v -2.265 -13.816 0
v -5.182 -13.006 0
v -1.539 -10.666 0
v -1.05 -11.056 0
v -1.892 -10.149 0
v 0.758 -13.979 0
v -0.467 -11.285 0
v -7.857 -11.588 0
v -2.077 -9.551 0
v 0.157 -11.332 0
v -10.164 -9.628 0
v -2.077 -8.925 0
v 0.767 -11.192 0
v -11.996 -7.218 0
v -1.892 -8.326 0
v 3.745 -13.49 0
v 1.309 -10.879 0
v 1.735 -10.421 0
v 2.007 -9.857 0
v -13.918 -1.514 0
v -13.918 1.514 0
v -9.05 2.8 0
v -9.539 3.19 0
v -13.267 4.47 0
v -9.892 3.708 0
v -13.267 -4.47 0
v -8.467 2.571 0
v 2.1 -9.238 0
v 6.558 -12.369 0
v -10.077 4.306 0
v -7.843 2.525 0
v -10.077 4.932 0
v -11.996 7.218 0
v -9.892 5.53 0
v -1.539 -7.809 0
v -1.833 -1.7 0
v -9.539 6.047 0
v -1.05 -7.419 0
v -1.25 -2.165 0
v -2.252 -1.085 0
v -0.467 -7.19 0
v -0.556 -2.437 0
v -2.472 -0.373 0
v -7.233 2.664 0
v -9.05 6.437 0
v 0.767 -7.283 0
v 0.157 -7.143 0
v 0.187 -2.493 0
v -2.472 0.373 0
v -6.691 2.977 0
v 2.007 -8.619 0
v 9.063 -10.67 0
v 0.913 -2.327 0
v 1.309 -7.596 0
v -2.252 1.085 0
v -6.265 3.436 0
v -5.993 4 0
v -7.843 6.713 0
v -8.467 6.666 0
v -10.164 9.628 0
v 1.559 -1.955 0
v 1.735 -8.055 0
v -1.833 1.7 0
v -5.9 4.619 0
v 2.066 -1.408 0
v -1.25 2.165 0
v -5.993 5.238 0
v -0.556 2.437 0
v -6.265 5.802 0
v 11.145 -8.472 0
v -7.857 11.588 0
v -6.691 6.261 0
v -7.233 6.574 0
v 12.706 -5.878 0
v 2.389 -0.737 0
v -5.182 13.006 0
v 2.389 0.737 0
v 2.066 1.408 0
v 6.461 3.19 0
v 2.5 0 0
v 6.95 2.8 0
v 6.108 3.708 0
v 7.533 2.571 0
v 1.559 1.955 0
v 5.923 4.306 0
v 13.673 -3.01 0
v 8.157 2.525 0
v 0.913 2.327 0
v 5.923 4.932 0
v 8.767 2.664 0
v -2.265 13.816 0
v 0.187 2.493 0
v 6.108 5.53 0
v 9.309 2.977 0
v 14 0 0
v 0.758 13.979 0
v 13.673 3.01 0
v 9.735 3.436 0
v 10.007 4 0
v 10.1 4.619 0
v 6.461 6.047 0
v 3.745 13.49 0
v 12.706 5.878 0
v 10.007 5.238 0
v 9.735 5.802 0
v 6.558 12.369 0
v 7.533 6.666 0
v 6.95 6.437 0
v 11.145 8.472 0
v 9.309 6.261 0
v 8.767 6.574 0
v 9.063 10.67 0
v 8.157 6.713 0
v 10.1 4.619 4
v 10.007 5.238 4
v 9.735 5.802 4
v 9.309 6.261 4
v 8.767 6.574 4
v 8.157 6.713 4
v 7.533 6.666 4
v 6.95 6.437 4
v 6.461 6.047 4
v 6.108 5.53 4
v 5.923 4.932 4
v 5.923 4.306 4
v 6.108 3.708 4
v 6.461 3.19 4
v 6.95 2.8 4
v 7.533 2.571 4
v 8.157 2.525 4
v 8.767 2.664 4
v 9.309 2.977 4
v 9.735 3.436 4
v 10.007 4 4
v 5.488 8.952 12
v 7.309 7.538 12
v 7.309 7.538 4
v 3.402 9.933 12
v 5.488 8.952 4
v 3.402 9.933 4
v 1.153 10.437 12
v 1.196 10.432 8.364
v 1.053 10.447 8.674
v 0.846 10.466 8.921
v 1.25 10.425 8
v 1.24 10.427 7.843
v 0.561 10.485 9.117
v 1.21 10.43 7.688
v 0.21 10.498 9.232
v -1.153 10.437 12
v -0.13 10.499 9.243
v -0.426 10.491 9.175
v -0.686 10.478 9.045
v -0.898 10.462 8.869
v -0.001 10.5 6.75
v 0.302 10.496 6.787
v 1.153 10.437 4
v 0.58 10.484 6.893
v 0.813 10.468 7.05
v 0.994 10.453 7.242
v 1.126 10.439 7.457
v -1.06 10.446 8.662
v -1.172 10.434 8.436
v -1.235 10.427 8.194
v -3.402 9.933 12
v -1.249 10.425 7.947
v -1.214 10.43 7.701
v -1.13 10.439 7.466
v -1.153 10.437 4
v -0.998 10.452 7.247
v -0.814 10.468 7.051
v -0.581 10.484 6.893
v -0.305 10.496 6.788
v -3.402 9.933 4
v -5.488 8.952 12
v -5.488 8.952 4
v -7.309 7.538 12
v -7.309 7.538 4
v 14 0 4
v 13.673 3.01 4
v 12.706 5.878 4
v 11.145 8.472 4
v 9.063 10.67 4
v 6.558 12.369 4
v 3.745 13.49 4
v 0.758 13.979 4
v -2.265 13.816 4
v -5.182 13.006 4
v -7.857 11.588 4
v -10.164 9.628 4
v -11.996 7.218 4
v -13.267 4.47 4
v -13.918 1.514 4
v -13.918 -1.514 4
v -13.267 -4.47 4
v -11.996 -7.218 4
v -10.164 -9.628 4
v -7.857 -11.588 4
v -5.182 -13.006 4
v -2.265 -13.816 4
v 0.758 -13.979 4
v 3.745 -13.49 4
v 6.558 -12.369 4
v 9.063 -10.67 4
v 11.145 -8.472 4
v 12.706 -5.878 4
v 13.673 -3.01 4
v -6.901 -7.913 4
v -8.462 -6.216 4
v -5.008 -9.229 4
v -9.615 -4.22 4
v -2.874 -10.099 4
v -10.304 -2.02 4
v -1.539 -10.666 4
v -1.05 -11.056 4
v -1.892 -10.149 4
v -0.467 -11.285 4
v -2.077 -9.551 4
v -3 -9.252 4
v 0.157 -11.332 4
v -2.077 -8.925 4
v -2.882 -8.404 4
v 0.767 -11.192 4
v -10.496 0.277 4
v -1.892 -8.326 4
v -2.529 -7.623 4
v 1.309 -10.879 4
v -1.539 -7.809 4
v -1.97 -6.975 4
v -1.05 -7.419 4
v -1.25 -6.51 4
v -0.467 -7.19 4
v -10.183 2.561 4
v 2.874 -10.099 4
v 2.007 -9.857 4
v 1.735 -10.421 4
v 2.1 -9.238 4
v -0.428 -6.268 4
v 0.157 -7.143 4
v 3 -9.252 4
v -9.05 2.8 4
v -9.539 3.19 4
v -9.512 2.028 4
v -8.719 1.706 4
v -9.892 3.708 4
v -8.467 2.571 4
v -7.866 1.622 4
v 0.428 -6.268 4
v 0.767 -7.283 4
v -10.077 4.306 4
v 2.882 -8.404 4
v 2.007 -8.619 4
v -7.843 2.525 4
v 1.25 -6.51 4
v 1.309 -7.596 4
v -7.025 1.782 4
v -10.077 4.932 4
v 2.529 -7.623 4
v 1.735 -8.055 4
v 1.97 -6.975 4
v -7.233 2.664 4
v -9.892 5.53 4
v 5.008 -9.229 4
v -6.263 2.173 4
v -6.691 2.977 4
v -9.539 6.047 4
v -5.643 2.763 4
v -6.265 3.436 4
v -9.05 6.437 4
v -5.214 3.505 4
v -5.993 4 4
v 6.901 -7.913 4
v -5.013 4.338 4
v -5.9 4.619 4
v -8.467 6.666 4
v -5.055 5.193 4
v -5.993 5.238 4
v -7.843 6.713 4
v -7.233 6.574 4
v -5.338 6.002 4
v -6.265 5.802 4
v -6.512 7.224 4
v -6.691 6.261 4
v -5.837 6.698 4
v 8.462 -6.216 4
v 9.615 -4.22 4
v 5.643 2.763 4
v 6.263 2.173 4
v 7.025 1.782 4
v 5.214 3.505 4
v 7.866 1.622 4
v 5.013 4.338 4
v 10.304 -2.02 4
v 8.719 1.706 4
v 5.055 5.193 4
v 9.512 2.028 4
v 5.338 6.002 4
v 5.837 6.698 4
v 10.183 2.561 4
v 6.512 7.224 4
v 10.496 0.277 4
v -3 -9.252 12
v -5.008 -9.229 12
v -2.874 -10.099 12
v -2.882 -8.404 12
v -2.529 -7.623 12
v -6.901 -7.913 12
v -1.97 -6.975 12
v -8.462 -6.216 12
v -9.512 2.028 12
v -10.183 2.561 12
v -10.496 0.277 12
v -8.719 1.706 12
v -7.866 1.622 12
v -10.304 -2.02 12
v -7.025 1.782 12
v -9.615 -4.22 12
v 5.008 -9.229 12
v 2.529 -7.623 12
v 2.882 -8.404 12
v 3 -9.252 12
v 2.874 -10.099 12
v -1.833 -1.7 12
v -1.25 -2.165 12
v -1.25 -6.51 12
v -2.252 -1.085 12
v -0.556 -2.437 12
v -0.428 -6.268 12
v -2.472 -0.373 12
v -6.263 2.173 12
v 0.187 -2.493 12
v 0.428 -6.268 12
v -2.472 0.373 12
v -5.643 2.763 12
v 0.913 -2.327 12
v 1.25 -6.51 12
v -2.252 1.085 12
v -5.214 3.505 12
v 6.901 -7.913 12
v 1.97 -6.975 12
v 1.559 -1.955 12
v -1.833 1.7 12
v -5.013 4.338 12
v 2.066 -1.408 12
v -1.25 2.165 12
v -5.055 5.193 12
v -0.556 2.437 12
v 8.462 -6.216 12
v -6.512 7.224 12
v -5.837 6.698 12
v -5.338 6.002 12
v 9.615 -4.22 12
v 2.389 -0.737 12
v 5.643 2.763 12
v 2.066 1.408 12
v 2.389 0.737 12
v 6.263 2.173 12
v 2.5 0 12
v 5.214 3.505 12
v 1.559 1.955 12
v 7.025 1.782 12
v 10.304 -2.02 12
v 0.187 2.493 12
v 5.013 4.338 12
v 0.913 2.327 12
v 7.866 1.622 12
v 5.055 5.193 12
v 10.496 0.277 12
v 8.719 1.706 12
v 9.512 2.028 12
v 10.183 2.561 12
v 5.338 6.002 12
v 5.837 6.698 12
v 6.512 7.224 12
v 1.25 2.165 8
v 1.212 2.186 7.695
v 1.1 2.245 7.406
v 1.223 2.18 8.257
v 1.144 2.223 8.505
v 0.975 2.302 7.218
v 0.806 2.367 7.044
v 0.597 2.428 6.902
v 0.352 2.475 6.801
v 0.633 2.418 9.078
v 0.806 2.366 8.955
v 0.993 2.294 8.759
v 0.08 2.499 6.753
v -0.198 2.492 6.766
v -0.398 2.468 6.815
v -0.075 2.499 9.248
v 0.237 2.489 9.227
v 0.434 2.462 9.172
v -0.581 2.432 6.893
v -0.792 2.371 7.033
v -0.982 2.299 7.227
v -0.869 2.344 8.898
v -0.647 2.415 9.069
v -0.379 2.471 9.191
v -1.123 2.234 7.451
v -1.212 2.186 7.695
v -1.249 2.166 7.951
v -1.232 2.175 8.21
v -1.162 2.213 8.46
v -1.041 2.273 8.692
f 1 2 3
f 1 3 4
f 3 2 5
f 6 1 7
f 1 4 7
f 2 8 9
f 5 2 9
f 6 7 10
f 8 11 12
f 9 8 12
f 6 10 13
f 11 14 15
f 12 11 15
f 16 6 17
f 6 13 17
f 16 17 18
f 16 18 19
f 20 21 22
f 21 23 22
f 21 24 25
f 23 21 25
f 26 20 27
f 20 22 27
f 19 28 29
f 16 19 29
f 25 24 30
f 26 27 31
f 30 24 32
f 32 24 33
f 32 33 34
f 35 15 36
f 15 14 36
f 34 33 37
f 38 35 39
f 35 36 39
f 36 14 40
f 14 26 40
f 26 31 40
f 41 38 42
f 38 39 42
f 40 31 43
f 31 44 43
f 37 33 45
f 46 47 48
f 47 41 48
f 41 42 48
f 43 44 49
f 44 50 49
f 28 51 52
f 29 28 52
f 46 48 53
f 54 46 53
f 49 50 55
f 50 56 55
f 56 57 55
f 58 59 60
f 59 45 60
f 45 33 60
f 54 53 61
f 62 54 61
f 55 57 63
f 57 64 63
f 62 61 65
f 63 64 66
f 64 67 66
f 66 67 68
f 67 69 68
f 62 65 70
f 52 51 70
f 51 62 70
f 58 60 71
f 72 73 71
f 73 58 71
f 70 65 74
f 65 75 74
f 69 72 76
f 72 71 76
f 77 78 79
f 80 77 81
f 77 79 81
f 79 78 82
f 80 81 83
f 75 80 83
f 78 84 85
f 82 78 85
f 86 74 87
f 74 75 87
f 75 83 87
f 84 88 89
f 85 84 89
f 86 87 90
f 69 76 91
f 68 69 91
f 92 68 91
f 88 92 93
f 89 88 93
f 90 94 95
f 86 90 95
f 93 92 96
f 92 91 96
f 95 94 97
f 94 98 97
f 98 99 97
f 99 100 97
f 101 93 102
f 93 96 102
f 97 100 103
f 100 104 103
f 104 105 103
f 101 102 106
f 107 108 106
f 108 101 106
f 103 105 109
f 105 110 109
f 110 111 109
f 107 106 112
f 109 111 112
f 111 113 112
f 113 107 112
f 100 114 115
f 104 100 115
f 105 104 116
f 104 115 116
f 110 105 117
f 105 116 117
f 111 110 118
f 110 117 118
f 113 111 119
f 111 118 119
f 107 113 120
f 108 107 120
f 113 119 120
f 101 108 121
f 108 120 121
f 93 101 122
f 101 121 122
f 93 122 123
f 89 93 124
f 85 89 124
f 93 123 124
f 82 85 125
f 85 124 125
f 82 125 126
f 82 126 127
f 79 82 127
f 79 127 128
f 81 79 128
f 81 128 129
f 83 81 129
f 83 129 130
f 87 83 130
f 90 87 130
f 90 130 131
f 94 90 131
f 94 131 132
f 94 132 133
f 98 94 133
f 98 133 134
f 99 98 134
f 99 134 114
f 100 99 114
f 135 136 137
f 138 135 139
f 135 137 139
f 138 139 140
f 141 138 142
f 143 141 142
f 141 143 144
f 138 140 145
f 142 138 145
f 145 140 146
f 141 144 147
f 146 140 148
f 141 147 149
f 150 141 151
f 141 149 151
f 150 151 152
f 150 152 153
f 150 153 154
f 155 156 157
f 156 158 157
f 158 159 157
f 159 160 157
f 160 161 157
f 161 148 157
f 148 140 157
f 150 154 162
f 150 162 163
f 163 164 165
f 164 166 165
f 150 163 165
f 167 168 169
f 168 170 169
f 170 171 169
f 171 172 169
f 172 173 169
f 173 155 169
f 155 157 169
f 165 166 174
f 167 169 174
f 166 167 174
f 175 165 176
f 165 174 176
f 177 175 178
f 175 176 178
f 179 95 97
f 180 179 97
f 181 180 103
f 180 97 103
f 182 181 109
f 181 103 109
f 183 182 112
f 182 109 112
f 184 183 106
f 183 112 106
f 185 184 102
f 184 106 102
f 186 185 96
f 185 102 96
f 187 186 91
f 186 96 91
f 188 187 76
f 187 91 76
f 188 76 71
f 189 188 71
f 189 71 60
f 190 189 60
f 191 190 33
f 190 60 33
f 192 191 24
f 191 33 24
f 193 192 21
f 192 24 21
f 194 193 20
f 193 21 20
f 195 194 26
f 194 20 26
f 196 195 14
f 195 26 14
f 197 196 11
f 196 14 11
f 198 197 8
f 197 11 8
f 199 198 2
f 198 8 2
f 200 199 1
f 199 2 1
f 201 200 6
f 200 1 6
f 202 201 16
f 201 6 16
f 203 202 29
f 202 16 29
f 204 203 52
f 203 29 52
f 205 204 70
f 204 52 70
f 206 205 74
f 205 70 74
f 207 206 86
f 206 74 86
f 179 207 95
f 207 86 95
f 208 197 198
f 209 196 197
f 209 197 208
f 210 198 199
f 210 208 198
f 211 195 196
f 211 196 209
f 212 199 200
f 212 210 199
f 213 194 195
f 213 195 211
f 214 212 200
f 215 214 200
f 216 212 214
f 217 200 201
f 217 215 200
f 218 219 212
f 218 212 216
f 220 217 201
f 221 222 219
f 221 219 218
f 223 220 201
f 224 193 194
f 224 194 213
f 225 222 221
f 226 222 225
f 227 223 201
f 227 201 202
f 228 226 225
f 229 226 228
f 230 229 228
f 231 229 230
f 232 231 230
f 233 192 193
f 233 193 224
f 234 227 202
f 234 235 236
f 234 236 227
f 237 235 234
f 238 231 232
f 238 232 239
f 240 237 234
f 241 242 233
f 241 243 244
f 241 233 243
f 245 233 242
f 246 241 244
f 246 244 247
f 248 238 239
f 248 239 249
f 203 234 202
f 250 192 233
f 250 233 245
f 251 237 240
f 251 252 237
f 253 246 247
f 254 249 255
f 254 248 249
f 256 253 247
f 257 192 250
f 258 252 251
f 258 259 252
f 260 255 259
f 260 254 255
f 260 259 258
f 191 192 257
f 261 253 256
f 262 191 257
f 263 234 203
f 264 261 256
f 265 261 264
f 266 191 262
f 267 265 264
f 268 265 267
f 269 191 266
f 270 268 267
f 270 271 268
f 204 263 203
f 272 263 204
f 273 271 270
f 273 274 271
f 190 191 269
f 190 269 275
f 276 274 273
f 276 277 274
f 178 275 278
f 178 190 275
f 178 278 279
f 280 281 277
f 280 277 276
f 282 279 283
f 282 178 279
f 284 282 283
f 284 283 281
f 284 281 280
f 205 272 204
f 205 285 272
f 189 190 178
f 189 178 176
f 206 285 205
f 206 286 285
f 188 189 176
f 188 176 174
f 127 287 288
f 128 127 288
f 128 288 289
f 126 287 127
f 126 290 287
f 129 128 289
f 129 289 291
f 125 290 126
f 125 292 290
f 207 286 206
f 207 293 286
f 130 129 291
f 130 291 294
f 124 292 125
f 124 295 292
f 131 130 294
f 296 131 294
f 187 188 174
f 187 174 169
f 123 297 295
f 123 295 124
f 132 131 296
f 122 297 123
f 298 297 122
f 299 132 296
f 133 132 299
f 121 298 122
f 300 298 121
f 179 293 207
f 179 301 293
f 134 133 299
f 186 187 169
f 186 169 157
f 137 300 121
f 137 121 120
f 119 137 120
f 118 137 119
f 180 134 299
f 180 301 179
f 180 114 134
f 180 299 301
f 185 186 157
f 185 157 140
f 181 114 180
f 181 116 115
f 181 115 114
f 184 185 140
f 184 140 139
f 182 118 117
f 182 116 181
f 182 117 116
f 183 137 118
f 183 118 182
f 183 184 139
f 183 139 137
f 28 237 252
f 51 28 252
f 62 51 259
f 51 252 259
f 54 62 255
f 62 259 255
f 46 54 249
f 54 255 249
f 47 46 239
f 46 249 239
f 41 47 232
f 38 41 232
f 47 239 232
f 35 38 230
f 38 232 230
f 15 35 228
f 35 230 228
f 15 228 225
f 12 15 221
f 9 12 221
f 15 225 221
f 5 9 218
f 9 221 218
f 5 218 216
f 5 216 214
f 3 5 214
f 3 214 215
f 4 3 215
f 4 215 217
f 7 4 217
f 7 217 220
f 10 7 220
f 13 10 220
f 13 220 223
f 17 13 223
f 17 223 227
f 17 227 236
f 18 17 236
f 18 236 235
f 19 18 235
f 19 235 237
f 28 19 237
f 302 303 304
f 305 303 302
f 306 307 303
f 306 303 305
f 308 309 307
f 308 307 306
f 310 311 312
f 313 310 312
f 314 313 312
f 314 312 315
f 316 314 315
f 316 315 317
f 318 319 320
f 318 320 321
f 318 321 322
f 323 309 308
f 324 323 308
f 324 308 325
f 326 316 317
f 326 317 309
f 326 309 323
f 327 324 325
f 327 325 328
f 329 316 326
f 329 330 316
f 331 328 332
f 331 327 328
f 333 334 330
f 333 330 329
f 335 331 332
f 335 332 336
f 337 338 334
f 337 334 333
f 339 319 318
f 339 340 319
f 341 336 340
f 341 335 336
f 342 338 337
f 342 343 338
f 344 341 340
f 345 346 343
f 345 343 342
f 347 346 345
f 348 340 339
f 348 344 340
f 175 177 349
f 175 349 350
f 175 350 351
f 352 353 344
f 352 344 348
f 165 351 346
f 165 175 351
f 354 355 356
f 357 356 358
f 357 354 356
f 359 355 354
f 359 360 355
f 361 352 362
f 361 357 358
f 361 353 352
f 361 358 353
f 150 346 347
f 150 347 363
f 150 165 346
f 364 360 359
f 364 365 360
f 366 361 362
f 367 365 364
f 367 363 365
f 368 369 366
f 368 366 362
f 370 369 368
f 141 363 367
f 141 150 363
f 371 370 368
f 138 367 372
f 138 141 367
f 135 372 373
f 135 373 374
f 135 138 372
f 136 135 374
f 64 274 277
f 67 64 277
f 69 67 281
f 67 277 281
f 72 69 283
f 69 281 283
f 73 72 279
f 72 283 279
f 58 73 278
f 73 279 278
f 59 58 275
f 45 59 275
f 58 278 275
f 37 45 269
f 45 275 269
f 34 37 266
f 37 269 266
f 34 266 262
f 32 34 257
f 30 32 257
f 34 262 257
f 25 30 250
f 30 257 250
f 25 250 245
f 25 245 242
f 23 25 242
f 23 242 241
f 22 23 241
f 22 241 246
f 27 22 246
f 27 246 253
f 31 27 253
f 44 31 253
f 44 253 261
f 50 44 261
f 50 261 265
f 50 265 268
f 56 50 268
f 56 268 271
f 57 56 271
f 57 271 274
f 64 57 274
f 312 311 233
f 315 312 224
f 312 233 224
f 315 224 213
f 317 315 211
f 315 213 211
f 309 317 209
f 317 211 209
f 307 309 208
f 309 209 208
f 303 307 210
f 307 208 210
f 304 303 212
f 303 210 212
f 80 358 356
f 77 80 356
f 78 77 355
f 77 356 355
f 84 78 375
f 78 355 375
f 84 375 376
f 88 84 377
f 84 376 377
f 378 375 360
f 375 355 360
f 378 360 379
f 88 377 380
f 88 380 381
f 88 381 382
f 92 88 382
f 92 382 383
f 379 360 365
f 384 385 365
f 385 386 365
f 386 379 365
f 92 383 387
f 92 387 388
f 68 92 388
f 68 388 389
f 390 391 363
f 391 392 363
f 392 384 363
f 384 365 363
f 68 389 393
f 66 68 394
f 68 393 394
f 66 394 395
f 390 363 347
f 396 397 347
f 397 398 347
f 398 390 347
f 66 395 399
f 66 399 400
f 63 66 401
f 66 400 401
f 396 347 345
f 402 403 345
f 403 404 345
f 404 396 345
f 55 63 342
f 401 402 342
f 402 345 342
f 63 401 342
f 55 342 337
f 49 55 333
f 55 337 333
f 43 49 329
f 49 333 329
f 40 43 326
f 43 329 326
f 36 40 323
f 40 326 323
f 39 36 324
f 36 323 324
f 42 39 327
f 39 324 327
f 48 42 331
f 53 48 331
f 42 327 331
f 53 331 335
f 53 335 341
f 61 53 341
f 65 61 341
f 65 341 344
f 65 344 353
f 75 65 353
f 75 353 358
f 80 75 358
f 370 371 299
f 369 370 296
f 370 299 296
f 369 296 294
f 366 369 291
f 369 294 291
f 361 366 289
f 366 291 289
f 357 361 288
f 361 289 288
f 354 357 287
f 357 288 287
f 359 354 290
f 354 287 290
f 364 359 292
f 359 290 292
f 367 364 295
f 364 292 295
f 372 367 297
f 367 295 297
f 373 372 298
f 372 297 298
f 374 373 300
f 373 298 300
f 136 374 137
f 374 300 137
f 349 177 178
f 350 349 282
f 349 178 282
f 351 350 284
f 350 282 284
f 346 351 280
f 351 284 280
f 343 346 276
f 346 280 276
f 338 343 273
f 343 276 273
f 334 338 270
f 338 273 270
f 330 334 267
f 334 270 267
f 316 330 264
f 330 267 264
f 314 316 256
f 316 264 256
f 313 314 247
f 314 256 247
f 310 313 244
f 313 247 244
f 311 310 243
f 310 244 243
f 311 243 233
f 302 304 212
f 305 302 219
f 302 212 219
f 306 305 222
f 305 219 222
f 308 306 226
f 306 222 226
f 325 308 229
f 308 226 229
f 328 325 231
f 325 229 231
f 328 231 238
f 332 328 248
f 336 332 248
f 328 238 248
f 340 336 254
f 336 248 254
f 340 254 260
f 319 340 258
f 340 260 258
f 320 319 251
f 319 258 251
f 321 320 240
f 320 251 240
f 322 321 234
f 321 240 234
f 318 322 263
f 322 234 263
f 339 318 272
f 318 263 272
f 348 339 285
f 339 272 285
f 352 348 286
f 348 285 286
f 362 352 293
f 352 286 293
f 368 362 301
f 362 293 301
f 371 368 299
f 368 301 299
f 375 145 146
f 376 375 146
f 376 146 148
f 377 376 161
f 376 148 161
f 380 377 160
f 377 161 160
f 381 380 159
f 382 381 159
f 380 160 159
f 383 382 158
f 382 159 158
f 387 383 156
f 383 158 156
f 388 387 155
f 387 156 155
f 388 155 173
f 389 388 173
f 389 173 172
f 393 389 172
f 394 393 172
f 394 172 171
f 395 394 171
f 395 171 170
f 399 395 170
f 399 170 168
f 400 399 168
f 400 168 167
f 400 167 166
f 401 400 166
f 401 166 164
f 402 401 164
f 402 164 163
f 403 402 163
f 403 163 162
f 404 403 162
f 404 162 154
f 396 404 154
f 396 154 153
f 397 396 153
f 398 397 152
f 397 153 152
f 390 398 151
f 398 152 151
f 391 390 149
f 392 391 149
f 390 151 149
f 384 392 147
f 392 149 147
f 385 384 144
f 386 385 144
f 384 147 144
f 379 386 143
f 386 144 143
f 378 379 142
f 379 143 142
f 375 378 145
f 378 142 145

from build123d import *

# Parameters (mm, degrees)
SKIZZE1_R                       = 14
AUFSATZ_LINEAR_AUSTRAGEN1_DEPTH = 4
SKIZZE3_R                       = 2.1
SCHNITT_LINEAR_AUSTRAGEN1_DEPTH = 5
SKIZZE2_R                       = 10.5
AUFSATZ_LINEAR_AUSTRAGEN2_DEPTH = 8
SCHNITT_LINEAR_AUSTRAGEN2_REACH = 10
SKIZZE5_R                       = 3
SKIZZE6_R                       = 2.5
SCHNITT_LINEAR_AUSTRAGEN3_DEPTH = 13
SCHNITT_LINEAR_AUSTRAGEN4_REACH = 26.5
SKIZZE7_R                       = 1.25


with BuildPart() as part:
    # Skizze1 → Aufsatz-Linear austragen1 (new body)
    with BuildSketch(Plane.XY):
        Circle(SKIZZE1_R)
    extrude(amount=AUFSATZ_LINEAR_AUSTRAGEN1_DEPTH)

    # Skizze3 → Schnitt-Linear austragen1 (cut, through all)
    with BuildSketch(Plane.XY.offset(4)):
        with Locations((-8, 4.618802154)):
            Circle(SKIZZE3_R)
        with Locations((8, 4.618802154)):
            Circle(SKIZZE3_R)
        with Locations((0, -9.237604307)):
            Circle(SKIZZE3_R)
    extrude(amount=-SCHNITT_LINEAR_AUSTRAGEN1_DEPTH, mode=Mode.SUBTRACT)

    # Skizze2 → Aufsatz-Linear austragen2 (add)
    with BuildSketch(Plane.XY.offset(4)):
        Circle(SKIZZE2_R)
    extrude(amount=AUFSATZ_LINEAR_AUSTRAGEN2_DEPTH)

    # Skizze5 → Schnitt-Linear austragen2 (cut, up to next)
    with BuildSketch(Plane(origin=(0, 0, 4), x_dir=(-1, 0, 0), z_dir=(0, 0, -1)), mode=Mode.PRIVATE) as schnitt_linear_austragen2_sk1:
        with Locations((-8, 4.618802154)):
            Circle(SKIZZE5_R)
    schnitt_linear_austragen2_tool1 = extrude(schnitt_linear_austragen2_sk1.sketch, amount=-SCHNITT_LINEAR_AUSTRAGEN2_REACH, mode=Mode.PRIVATE) & part.part
    add(schnitt_linear_austragen2_tool1.solids().sort_by_distance((8, 4.618802, 4))[0], mode=Mode.SUBTRACT)
    # Skizze5 → Schnitt-Linear austragen2 (cut, up to next)
    with BuildSketch(Plane(origin=(0, 0, 4), x_dir=(-1, 0, 0), z_dir=(0, 0, -1)), mode=Mode.PRIVATE) as schnitt_linear_austragen2_sk2:
        with Locations((8, 4.618802154)):
            Circle(SKIZZE5_R)
    schnitt_linear_austragen2_tool2 = extrude(schnitt_linear_austragen2_sk2.sketch, amount=-SCHNITT_LINEAR_AUSTRAGEN2_REACH, mode=Mode.PRIVATE) & part.part
    add(schnitt_linear_austragen2_tool2.solids().sort_by_distance((-8, 4.618802, 4))[0], mode=Mode.SUBTRACT)
    # Skizze5 → Schnitt-Linear austragen2 (cut, up to next)
    with BuildSketch(Plane(origin=(0, 0, 4), x_dir=(-1, 0, 0), z_dir=(0, 0, -1)), mode=Mode.PRIVATE) as schnitt_linear_austragen2_sk3:
        with Locations((0, -9.237604307)):
            Circle(SKIZZE5_R)
    schnitt_linear_austragen2_tool3 = extrude(schnitt_linear_austragen2_sk3.sketch, amount=-SCHNITT_LINEAR_AUSTRAGEN2_REACH, mode=Mode.PRIVATE) & part.part
    add(schnitt_linear_austragen2_tool3.solids().sort_by_distance((0, -9.237604, 4))[0], mode=Mode.SUBTRACT)

    # Skizze6 → Schnitt-Linear austragen3 (cut, through all)
    with BuildSketch(Plane.XY.offset(12)):
        Circle(SKIZZE6_R)
    extrude(amount=-SCHNITT_LINEAR_AUSTRAGEN3_DEPTH, mode=Mode.SUBTRACT)

    # Skizze7 → Schnitt-Linear austragen4 (cut, up to next)
    with BuildSketch(Plane(origin=(0, 10.5, 0), x_dir=(1, 0, 0), z_dir=(0, 1, 0)), mode=Mode.PRIVATE) as schnitt_linear_austragen4_sk1:
        with Locations((0, -8)):
            Circle(SKIZZE7_R)
    schnitt_linear_austragen4_tool1 = extrude(schnitt_linear_austragen4_sk1.sketch, amount=-SCHNITT_LINEAR_AUSTRAGEN4_REACH, mode=Mode.PRIVATE) & part.part
    add(schnitt_linear_austragen4_tool1.solids().sort_by_distance((0, 10.5, 8))[0], mode=Mode.SUBTRACT)


solid = part.part
